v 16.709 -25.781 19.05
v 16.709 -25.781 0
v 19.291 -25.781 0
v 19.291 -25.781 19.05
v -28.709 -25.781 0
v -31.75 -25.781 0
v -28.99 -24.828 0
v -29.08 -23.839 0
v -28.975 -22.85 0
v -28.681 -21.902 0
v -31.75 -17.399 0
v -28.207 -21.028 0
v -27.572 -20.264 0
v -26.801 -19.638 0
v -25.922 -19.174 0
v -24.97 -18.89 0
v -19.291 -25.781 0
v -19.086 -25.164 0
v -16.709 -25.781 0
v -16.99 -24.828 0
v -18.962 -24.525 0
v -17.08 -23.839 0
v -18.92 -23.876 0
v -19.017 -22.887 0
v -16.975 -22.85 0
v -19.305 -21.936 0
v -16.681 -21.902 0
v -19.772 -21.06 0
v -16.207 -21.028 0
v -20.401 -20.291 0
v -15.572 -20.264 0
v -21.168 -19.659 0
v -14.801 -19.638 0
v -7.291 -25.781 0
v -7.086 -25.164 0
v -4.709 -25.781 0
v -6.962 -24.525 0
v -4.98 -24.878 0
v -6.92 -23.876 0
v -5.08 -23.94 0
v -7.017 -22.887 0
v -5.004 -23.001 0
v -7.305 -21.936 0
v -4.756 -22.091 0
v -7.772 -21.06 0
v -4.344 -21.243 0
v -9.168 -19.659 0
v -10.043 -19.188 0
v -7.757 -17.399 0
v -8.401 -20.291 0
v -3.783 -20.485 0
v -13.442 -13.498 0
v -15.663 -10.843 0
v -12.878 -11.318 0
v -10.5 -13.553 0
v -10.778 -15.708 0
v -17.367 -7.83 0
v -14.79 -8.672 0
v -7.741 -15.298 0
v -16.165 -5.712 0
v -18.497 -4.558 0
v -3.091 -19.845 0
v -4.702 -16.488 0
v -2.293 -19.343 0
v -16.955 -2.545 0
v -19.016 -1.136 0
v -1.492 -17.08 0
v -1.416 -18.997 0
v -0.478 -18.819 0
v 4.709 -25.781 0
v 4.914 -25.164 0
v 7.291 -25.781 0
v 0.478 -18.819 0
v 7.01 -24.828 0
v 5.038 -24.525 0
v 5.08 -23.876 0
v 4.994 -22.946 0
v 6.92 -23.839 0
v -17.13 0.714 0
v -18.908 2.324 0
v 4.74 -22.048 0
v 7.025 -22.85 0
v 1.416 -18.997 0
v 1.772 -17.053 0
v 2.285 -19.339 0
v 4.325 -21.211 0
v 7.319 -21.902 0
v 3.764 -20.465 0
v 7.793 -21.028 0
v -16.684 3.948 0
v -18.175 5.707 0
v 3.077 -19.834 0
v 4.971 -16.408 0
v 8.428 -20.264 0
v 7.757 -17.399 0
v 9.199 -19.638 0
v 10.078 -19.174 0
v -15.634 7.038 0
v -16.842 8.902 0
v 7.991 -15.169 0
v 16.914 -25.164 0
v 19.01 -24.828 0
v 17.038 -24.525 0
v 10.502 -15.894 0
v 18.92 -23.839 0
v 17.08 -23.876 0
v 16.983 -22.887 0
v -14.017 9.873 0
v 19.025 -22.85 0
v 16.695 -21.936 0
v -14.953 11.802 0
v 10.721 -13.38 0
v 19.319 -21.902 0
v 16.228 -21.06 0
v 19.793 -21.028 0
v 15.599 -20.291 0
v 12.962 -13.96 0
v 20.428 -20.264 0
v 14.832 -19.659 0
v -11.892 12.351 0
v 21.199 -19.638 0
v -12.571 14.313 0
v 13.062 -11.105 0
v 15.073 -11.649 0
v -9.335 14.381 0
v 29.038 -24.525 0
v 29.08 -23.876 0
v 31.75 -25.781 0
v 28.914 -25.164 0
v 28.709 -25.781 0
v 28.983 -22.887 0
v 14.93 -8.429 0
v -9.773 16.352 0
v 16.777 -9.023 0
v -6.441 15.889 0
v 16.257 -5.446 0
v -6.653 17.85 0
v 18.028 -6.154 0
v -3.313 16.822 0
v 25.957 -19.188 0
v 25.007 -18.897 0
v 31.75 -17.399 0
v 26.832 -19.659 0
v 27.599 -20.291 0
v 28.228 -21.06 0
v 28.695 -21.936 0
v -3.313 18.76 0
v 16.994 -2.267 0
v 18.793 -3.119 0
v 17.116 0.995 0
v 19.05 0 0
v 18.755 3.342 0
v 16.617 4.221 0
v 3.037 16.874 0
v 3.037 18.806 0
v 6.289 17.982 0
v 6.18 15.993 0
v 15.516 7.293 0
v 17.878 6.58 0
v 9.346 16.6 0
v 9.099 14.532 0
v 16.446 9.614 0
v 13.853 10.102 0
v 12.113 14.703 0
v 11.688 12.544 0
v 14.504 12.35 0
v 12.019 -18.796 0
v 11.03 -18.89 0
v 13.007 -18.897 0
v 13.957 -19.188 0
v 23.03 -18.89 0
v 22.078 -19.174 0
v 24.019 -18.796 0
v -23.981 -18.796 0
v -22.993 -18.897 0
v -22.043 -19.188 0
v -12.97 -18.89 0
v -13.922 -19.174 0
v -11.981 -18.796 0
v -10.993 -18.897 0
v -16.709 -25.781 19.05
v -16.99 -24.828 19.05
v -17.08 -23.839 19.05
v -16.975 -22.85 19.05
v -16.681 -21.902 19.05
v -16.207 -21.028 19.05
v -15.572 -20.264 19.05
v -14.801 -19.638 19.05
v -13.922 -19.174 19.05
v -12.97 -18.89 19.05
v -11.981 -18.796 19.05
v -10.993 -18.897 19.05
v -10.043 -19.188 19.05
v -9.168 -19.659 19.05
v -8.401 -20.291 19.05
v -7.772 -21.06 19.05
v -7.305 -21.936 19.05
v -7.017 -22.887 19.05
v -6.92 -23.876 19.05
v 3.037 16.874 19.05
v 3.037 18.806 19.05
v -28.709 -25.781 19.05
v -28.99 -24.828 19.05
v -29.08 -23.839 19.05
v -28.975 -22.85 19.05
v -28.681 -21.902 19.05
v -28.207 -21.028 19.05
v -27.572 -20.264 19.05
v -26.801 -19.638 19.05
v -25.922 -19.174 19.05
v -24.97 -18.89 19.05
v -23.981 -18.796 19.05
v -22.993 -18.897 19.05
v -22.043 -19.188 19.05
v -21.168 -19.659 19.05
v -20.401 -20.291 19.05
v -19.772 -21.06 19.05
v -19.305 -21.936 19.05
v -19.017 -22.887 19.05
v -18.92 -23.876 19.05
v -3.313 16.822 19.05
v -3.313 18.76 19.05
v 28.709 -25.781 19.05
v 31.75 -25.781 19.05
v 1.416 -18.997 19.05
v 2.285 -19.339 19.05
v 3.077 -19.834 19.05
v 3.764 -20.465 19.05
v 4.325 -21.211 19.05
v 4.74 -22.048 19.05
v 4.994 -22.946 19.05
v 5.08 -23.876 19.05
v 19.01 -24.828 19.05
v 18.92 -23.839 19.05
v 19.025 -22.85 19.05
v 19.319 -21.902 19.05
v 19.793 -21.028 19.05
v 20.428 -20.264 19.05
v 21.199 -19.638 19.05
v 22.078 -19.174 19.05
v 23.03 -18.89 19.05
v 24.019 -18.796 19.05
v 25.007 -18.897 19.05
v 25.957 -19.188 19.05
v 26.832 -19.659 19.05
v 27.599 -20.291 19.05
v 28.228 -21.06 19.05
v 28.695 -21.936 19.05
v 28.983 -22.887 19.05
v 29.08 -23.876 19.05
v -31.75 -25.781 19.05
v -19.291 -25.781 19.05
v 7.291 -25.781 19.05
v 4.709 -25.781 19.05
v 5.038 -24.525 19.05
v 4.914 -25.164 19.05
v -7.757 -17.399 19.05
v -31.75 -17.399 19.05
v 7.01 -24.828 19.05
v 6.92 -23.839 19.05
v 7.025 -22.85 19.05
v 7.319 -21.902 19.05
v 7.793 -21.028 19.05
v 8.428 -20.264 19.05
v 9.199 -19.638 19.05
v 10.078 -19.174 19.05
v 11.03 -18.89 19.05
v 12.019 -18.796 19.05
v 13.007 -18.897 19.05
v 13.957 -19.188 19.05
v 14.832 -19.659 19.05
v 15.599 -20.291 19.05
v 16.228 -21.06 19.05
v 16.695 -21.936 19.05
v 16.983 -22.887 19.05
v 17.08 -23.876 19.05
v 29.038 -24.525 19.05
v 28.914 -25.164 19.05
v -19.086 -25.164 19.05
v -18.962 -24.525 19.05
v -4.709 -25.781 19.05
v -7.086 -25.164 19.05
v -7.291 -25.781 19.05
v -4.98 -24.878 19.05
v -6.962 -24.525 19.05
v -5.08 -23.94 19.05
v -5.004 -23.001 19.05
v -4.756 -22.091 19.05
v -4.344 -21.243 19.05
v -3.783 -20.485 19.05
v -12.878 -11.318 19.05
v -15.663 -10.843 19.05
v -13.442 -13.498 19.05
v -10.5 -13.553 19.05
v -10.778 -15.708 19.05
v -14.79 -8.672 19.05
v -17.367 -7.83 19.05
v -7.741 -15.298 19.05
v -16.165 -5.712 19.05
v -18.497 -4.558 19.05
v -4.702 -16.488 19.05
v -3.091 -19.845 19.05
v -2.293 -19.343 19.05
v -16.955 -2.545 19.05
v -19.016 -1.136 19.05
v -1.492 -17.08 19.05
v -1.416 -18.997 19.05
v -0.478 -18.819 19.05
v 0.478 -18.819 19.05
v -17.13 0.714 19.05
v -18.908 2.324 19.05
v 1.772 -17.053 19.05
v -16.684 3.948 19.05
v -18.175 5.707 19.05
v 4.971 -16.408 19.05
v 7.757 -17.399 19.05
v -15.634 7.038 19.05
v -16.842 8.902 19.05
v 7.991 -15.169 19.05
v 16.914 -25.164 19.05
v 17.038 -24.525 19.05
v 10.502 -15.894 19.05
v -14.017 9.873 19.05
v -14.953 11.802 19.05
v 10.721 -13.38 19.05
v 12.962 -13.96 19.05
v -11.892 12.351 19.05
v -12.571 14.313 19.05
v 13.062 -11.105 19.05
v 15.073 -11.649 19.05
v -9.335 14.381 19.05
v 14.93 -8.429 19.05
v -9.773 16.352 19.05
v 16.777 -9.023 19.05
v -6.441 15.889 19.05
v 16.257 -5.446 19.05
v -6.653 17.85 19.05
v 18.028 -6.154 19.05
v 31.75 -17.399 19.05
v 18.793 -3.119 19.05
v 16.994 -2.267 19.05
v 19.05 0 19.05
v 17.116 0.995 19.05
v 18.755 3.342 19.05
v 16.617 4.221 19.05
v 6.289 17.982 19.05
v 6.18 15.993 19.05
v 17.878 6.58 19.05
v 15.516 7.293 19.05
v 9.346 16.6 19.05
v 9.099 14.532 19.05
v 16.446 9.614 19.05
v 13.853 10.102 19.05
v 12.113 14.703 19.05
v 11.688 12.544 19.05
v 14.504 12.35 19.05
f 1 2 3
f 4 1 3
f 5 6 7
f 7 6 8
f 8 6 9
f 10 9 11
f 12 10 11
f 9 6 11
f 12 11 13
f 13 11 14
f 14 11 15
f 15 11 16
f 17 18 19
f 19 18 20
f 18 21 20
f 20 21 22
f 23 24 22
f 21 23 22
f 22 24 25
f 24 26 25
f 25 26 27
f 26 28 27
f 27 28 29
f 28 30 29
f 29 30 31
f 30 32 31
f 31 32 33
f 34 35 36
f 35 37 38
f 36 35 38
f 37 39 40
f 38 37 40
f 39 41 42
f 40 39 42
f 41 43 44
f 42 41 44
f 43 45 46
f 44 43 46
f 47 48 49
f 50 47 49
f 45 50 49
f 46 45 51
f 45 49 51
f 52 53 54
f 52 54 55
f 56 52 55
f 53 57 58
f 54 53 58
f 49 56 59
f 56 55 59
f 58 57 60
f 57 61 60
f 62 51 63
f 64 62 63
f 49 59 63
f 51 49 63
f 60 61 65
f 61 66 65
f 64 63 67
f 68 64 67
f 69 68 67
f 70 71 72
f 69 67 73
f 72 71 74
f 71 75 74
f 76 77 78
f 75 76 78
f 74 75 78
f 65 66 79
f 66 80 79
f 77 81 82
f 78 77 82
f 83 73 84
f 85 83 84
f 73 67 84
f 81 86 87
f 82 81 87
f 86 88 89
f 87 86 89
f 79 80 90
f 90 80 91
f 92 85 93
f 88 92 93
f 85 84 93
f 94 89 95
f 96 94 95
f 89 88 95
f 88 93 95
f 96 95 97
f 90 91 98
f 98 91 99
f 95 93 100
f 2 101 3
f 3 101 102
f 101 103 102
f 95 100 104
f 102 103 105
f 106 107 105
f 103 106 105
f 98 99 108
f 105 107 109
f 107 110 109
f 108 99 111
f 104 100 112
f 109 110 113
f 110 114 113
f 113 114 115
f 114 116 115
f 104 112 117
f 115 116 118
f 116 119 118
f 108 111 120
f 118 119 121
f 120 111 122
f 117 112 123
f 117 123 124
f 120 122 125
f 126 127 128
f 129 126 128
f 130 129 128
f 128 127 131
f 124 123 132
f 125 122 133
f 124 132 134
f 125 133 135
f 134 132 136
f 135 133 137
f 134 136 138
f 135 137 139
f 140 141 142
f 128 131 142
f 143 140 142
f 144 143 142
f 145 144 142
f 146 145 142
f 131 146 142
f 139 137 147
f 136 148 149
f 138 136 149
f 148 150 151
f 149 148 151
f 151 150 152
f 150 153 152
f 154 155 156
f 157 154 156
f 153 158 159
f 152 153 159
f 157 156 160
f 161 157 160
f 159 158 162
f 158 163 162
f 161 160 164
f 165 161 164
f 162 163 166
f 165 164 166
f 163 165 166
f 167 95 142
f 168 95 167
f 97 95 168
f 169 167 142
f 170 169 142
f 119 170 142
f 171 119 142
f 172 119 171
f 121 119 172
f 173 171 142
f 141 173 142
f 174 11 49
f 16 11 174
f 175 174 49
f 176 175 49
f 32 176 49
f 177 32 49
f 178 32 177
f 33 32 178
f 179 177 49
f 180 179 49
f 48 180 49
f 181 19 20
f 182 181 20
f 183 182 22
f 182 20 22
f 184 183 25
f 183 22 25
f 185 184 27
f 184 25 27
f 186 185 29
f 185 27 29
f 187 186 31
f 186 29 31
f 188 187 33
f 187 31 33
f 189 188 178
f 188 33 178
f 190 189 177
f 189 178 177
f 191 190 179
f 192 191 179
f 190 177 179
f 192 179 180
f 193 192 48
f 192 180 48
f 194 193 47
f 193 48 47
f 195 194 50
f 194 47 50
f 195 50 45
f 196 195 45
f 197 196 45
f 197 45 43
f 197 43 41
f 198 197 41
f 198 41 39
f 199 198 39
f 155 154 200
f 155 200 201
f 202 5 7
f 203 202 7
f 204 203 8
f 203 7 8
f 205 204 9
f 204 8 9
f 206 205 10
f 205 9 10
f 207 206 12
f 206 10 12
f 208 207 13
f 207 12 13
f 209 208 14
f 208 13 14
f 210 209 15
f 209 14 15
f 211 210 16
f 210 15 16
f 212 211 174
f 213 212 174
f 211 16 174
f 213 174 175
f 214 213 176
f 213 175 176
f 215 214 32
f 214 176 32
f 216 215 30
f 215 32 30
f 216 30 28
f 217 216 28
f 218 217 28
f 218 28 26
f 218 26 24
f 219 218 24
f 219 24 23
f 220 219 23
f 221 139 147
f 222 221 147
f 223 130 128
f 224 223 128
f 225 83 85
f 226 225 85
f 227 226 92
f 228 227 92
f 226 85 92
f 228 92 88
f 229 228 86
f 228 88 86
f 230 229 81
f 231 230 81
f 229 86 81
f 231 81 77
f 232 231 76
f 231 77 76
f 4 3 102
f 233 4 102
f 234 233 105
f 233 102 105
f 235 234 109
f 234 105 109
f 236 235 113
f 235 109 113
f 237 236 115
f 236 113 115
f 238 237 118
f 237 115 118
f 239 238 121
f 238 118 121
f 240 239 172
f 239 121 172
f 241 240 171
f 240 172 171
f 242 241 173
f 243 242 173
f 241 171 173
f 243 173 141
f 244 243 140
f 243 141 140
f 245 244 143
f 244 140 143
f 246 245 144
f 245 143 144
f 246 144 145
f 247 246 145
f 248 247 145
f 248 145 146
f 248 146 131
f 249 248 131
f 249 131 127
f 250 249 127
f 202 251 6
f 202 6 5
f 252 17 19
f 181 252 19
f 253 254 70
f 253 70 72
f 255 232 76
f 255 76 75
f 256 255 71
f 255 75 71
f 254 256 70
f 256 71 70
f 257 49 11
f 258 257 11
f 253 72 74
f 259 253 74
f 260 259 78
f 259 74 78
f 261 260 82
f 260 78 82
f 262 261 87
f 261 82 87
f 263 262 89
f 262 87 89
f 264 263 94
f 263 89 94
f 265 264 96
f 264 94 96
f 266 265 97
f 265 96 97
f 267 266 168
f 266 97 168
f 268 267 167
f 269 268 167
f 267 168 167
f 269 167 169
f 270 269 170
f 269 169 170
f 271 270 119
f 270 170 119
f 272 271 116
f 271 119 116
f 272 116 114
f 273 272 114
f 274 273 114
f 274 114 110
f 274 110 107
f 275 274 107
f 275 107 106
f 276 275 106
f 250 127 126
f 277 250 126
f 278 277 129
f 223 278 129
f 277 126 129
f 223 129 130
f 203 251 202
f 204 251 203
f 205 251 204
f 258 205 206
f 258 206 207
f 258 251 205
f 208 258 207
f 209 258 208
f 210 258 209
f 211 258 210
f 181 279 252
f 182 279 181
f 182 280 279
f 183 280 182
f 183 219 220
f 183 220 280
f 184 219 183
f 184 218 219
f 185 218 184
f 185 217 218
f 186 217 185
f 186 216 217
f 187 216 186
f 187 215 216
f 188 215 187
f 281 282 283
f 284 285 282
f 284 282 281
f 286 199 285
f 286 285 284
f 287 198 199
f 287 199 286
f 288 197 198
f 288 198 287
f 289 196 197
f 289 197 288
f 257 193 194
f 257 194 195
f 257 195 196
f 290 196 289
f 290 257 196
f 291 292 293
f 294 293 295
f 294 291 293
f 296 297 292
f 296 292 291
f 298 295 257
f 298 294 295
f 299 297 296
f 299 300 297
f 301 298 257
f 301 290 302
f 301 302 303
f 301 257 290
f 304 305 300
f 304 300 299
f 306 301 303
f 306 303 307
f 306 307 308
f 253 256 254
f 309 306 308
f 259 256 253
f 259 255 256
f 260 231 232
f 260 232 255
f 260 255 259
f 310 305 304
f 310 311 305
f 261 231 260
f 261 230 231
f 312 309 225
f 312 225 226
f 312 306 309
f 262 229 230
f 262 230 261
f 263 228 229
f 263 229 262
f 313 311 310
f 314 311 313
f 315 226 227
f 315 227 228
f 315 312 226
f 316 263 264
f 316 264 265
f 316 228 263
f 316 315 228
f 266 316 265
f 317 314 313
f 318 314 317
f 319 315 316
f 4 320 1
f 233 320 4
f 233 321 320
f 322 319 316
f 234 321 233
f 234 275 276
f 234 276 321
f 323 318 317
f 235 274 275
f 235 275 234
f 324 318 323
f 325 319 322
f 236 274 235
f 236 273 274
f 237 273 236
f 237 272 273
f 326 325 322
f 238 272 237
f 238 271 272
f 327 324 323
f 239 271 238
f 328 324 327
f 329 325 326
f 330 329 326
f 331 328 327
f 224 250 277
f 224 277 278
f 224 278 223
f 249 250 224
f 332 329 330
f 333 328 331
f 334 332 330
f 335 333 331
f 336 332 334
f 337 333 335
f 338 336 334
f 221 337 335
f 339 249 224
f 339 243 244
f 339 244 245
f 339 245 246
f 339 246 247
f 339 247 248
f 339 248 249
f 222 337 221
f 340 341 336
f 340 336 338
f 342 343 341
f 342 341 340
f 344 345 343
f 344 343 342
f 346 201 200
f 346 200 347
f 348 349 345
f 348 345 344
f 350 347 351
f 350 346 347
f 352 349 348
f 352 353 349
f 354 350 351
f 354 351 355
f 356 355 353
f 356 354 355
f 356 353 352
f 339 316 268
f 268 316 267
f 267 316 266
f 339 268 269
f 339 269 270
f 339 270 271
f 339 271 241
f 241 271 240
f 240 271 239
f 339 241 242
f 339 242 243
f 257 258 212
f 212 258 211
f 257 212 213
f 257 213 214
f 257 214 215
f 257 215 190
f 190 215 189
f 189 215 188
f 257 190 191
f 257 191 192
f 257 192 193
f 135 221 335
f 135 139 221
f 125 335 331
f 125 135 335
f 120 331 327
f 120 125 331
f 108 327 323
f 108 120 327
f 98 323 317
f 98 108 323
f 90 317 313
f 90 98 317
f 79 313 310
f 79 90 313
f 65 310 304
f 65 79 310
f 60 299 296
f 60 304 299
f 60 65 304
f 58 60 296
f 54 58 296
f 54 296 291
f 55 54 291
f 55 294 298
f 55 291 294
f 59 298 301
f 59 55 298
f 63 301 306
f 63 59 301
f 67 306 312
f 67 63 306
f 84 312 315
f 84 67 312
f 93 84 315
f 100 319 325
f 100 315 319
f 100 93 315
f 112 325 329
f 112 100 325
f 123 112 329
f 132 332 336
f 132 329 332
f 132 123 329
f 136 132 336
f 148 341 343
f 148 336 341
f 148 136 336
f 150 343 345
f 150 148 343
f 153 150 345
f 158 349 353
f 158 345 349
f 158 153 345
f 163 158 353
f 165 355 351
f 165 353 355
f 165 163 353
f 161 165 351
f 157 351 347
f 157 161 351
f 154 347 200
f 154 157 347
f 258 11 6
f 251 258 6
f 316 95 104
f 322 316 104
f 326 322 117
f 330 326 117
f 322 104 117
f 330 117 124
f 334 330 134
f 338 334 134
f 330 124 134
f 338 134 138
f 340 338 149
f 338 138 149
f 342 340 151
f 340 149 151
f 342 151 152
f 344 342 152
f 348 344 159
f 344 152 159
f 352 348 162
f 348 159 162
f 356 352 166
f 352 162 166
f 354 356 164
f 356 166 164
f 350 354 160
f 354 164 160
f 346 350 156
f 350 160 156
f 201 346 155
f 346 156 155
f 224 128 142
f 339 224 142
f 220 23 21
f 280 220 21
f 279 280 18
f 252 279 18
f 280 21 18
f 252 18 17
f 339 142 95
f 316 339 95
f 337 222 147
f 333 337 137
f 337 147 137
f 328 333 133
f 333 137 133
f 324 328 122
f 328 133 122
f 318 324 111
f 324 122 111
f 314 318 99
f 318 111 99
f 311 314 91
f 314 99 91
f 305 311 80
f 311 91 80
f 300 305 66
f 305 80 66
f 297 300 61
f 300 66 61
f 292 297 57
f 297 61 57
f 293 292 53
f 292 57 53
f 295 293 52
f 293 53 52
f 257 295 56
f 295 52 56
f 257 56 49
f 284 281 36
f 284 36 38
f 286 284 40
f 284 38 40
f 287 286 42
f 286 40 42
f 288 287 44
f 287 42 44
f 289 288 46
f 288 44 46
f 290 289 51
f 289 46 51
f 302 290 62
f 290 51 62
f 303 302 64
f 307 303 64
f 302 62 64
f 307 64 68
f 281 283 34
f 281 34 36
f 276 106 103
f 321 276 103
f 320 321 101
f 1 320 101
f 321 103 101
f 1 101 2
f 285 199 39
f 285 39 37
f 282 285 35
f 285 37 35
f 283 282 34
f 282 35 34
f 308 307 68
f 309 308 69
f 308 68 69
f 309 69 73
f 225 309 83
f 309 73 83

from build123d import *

# Parameters (mm, degrees)
F0_R     = 17.145
F1_DEPTH = 19.05
F2_DEPTH = 25.4
F3_W     = 6.35
F3_H     = 30.0934736039
F4_DEPTH = 25.4


# Not quite as in the source:
# - a feature names something its author has since deleted; it is built from what else it names


with BuildPart() as f1:
    # F0 (on Top) → F1 (new body)
    with BuildSketch(Plane.XY):
        with BuildLine():
            ThreePointArc((7.7574028515, -17.399), (15.9793777151, -10.3712095649), (19.05, 0))
            ThreePointArc((19.05, 0), (-10.3712095649, 15.9793777151), (-7.7574028515, -17.399))
            Line((-7.7574028515, -17.399), (7.7574028515, -17.399))
        make_face()
        Circle(F0_R, mode=Mode.SUBTRACT)
        with BuildLine():
            Line((7.7574028515, -17.399), (-7.7574028515, -17.399))
            ThreePointArc((-7.7574028515, -17.399), (-4.6557505543, -18.472316768), (-1.4158987787, -18.9973085106))
            ThreePointArc((-1.4158987787, -18.9973085106), (0, -18.796), (1.4158987787, -18.9973085106))
            ThreePointArc((1.4158987787, -18.9973085106), (4.6557505543, -18.472316768), (7.7574028515, -17.399))
        make_face()
        with BuildLine():
            Line((31.75, -17.399), (7.7574028515, -17.399))
            ThreePointArc((7.7574028515, -17.399), (4.6557505543, -18.472316768), (1.4158987787, -18.9973085106))
            ThreePointArc((1.4158987787, -18.9973085106), (4.0619678603, -20.8252923605), (5.08, -23.876))
            ThreePointArc((5.08, -23.876), (4.9864603217, -24.8463676933), (4.7092860393, -25.781))
            Line((4.7092860393, -25.781), (7.2907139607, -25.781))
            ThreePointArc((7.2907139607, -25.781), (11.0296323067, -18.8895396783), (17.08, -23.876))
            ThreePointArc((17.08, -23.876), (16.9864603217, -24.8463676933), (16.7092860393, -25.781))
            Line((16.7092860393, -25.781), (19.2907139607, -25.781))
            ThreePointArc((19.2907139607, -25.781), (23.0296323067, -18.8895396783), (29.08, -23.876))
            ThreePointArc((29.08, -23.876), (28.9864603217, -24.8463676933), (28.7092860393, -25.781))
            Line((28.7092860393, -25.781), (31.75, -25.781))
            Line((31.75, -25.781), (31.75, -17.399))
        make_face()
        with BuildLine():
            ThreePointArc((-1.4158987787, -18.9973085106), (-4.6557505543, -18.472316768), (-7.7574028515, -17.399))
            Line((-7.7574028515, -17.399), (-31.75, -17.399))
            Line((-31.75, -17.399), (-31.75, -25.781))
            Line((-31.75, -25.781), (-28.7092860393, -25.781))
            ThreePointArc((-28.7092860393, -25.781), (-24.9703676933, -18.8895396783), (-18.92, -23.876))
            ThreePointArc((-18.92, -23.876), (-19.0135396783, -24.8463676933), (-19.2907139607, -25.781))
            Line((-19.2907139607, -25.781), (-16.7092860393, -25.781))
            ThreePointArc((-16.7092860393, -25.781), (-12.9703676933, -18.8895396783), (-6.92, -23.876))
            ThreePointArc((-6.92, -23.876), (-7.0135396783, -24.8463676933), (-7.2907139607, -25.781))
            Line((-7.2907139607, -25.781), (-4.7092860393, -25.781))
            ThreePointArc((-4.7092860393, -25.781), (-4.5699113579, -21.6573720049), (-1.4158987787, -18.9973085106))
        make_face()
    extrude(amount=F1_DEPTH)

    # F0 (on Top) → F2 (cut)
    with BuildSketch(Plane.XY):
        with BuildLine():
            Line((-16.7092860393, -25.781), (-7.2907139607, -25.781))
            ThreePointArc((-7.2907139607, -25.781), (-7.0135396783, -24.8463676933), (-6.92, -23.876))
            ThreePointArc((-6.92, -23.876), (-12.9703676933, -18.8895396783), (-16.7092860393, -25.781))
        make_face()
        with BuildLine():
            ThreePointArc((-18.92, -23.876), (-24.9703676933, -18.8895396783), (-28.7092860393, -25.781))
            Line((-28.7092860393, -25.781), (-19.2907139607, -25.781))
            ThreePointArc((-19.2907139607, -25.781), (-19.0135396783, -24.8463676933), (-18.92, -23.876))
        make_face()
        with BuildLine():
            ThreePointArc((17.08, -23.876), (11.0296323067, -18.8895396783), (7.2907139607, -25.781))
            Line((7.2907139607, -25.781), (16.7092860393, -25.781))
            ThreePointArc((16.7092860393, -25.781), (16.9864603217, -24.8463676933), (17.08, -23.876))
        make_face()
    extrude(amount=F2_DEPTH, mode=Mode.SUBTRACT)

    # F3 (on Top) → F4 (cut)
    with BuildSketch(Plane.XY):
        with Locations((-0.1380435133, 15.0467368019)):
            Rectangle(F3_W, F3_H)
    extrude(amount=F4_DEPTH, mode=Mode.SUBTRACT)


solid = f1.part
